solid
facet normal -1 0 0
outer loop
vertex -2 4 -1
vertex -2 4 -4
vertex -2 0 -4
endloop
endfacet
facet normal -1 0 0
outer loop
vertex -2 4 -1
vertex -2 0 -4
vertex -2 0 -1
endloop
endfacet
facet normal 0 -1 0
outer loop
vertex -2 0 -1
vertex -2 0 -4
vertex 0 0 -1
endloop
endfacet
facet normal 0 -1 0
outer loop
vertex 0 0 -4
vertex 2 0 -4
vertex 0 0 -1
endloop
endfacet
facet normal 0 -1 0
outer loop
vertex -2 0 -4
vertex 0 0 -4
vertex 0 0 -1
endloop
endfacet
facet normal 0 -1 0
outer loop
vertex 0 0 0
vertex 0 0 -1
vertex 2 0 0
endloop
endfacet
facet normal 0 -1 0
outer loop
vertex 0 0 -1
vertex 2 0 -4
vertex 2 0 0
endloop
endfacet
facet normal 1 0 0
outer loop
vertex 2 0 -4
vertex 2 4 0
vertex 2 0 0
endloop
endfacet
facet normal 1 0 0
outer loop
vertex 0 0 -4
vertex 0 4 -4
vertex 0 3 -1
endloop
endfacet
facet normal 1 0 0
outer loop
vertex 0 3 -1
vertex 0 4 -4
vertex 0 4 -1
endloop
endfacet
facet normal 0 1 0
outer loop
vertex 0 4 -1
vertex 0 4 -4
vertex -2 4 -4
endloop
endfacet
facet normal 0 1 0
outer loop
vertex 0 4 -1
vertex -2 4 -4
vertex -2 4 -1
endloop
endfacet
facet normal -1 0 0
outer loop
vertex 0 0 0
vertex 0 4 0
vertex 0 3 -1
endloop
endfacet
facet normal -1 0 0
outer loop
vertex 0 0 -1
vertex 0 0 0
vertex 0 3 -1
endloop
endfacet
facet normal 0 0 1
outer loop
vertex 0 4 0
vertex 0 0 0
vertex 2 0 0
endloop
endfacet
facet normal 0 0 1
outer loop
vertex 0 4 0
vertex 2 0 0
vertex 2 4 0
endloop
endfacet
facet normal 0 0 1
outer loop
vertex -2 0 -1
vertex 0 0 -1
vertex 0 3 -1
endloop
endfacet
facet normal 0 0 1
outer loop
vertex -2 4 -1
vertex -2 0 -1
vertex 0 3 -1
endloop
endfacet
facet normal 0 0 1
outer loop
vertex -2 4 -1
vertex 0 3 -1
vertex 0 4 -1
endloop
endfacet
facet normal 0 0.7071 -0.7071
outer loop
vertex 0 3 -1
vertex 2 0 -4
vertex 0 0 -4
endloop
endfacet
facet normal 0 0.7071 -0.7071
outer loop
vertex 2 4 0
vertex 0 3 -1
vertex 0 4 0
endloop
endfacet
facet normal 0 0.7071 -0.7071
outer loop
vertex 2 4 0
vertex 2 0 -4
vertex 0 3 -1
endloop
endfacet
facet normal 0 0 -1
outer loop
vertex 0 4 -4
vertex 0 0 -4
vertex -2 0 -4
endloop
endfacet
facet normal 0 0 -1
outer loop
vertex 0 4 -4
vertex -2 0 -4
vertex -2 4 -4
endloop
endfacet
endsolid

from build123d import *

# Parameters (mm, degrees)
SKETCH1_W           = 4
SKETCH1_H           = 4
BOSS_EXTRUDE1_DEPTH = 2
SKETCH2_W           = 3
SKETCH2_H           = 4
BOSS_EXTRUDE2_DEPTH = 2
CUT_EXTRUDE1_DEPTH  = 2


with BuildPart() as part:
    # Sketch1 → Boss-Extrude1 (new body)
    with BuildSketch(Plane(origin=(0, 0, 0), x_dir=(0, 0, -1), z_dir=(1, 0, 0))):
        with Locations((2, 2)):
            Rectangle(SKETCH1_W, SKETCH1_H)
    extrude(amount=BOSS_EXTRUDE1_DEPTH)

    # Sketch2 → Boss-Extrude2 (add)
    with BuildSketch(Plane.ZY):
        with Locations((-2.5, 2)):
            Rectangle(SKETCH2_W, SKETCH2_H)
    extrude(amount=BOSS_EXTRUDE2_DEPTH)

    # Sketch3 → Cut-Extrude1 (cut)
    with BuildSketch(Plane(origin=(2, 0, 0), x_dir=(0, 0, -1), z_dir=(1, 0, 0))):
        Polygon((4, 0), (0, 4), (4, 4), align=None)
    extrude(amount=-CUT_EXTRUDE1_DEPTH, mode=Mode.SUBTRACT)


solid = part.part
